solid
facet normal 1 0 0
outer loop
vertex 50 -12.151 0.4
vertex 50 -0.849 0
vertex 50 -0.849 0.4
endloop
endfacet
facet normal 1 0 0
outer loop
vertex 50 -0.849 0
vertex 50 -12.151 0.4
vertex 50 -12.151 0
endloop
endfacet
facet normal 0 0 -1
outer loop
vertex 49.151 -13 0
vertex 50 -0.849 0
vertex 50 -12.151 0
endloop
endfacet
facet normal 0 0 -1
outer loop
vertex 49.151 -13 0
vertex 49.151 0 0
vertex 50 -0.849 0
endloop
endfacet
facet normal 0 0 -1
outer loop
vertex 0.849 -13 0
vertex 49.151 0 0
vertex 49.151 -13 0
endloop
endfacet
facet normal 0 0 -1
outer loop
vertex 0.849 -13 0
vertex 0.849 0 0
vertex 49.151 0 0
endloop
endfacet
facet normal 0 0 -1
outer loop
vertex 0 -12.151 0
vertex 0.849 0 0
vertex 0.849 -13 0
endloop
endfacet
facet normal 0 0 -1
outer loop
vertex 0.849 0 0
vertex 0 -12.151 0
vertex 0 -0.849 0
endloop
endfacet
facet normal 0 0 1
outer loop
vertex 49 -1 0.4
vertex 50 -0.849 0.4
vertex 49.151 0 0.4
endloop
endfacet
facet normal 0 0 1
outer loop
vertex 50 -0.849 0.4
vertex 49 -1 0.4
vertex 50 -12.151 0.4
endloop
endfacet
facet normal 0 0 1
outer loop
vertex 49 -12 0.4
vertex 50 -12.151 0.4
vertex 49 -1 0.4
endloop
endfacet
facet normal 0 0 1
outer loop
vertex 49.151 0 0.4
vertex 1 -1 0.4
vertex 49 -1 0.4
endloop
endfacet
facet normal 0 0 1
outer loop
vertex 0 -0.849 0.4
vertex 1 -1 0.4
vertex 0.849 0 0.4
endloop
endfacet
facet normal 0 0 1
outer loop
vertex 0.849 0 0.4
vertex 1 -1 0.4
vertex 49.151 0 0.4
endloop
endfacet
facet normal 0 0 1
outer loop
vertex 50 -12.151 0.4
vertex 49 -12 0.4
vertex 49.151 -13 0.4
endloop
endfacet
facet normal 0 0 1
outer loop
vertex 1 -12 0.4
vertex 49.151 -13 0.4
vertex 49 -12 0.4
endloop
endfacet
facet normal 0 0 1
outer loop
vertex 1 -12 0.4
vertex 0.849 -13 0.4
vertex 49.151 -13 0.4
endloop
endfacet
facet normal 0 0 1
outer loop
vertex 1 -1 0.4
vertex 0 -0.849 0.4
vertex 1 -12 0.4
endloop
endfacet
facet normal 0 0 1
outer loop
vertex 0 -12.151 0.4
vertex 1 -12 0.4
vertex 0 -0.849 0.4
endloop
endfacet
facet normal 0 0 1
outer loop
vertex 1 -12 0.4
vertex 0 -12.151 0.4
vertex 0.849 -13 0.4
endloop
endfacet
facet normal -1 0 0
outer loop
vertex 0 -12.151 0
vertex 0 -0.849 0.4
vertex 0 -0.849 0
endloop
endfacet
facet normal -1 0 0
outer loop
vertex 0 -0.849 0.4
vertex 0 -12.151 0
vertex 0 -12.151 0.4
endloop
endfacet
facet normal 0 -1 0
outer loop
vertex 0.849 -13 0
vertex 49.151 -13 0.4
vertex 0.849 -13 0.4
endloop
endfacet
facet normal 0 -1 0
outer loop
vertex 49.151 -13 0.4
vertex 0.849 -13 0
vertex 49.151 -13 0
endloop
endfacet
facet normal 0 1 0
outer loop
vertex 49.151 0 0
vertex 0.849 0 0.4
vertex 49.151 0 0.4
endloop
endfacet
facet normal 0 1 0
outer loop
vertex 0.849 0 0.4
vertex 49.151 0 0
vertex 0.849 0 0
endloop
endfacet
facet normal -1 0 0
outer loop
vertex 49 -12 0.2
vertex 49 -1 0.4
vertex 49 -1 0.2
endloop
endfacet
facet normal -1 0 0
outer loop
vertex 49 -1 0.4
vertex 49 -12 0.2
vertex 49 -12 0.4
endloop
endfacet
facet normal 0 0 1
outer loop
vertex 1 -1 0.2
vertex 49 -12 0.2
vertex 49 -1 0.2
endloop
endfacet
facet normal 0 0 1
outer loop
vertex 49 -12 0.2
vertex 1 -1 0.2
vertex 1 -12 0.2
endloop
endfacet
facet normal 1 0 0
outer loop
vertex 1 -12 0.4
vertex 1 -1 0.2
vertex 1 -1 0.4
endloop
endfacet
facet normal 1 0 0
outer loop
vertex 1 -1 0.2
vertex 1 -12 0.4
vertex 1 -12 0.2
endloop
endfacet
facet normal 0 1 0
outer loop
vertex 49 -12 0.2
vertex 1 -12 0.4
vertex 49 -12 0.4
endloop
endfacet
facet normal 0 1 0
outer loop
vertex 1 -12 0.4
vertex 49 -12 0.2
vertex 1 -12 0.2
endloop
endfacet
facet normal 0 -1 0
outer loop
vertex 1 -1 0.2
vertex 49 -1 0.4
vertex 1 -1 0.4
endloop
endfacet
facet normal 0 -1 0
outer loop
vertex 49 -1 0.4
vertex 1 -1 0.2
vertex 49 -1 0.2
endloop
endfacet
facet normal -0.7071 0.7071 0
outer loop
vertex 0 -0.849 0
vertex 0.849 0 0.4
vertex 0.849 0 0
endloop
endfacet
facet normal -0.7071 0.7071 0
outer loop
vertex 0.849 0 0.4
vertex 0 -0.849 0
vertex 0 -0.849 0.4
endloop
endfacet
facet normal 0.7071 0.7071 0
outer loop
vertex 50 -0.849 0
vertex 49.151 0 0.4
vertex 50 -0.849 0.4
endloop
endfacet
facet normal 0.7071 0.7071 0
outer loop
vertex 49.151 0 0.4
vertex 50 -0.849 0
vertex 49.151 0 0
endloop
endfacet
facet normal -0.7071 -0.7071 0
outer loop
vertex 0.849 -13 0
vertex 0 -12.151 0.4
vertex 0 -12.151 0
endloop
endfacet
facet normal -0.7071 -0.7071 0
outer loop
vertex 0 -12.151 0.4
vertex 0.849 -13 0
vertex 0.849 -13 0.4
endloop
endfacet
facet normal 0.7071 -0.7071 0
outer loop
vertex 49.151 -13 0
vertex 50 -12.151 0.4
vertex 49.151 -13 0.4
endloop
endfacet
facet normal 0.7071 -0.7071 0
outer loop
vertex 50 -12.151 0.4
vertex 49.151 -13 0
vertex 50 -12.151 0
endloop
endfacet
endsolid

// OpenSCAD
THICKNESS = 0.4;
EMBOSS = 0.3;

LENGTH = 50;
WIDTH = 13;

BORDER = 1;
CARVE = 0.2;
R = 1.2;

module all() {
    difference() {
        union() {
            // body
            translate([0, 0, -THICKNESS])
            cube([LENGTH, WIDTH, THICKNESS]);

            // logo
            resize([LENGTH, WIDTH, EMBOSS])
            linear_extrude(height=1)
            import("design.dxf");
        }

        // carved back
        translate([BORDER, BORDER, -THICKNESS])
        cube([LENGTH-BORDER*2, WIDTH-BORDER*2, CARVE]);

        // corners
        translate([0, 0, 0])      rotate([0, 0, 45]) cube([R, R, 10], true);
        translate([LENGTH, 0, 0]) rotate([0, 0, 45]) cube([R, R, 10], true);
        translate([0, WIDTH, 0])      rotate([0, 0, 45]) cube([R, R, 10], true);
        translate([LENGTH, WIDTH, 0]) rotate([0, 0, 45]) cube([R, R, 10], true);
    }
}

//k = 15/13;
//scale([k, k, 1])
rotate([180, 0, 0])
all();
